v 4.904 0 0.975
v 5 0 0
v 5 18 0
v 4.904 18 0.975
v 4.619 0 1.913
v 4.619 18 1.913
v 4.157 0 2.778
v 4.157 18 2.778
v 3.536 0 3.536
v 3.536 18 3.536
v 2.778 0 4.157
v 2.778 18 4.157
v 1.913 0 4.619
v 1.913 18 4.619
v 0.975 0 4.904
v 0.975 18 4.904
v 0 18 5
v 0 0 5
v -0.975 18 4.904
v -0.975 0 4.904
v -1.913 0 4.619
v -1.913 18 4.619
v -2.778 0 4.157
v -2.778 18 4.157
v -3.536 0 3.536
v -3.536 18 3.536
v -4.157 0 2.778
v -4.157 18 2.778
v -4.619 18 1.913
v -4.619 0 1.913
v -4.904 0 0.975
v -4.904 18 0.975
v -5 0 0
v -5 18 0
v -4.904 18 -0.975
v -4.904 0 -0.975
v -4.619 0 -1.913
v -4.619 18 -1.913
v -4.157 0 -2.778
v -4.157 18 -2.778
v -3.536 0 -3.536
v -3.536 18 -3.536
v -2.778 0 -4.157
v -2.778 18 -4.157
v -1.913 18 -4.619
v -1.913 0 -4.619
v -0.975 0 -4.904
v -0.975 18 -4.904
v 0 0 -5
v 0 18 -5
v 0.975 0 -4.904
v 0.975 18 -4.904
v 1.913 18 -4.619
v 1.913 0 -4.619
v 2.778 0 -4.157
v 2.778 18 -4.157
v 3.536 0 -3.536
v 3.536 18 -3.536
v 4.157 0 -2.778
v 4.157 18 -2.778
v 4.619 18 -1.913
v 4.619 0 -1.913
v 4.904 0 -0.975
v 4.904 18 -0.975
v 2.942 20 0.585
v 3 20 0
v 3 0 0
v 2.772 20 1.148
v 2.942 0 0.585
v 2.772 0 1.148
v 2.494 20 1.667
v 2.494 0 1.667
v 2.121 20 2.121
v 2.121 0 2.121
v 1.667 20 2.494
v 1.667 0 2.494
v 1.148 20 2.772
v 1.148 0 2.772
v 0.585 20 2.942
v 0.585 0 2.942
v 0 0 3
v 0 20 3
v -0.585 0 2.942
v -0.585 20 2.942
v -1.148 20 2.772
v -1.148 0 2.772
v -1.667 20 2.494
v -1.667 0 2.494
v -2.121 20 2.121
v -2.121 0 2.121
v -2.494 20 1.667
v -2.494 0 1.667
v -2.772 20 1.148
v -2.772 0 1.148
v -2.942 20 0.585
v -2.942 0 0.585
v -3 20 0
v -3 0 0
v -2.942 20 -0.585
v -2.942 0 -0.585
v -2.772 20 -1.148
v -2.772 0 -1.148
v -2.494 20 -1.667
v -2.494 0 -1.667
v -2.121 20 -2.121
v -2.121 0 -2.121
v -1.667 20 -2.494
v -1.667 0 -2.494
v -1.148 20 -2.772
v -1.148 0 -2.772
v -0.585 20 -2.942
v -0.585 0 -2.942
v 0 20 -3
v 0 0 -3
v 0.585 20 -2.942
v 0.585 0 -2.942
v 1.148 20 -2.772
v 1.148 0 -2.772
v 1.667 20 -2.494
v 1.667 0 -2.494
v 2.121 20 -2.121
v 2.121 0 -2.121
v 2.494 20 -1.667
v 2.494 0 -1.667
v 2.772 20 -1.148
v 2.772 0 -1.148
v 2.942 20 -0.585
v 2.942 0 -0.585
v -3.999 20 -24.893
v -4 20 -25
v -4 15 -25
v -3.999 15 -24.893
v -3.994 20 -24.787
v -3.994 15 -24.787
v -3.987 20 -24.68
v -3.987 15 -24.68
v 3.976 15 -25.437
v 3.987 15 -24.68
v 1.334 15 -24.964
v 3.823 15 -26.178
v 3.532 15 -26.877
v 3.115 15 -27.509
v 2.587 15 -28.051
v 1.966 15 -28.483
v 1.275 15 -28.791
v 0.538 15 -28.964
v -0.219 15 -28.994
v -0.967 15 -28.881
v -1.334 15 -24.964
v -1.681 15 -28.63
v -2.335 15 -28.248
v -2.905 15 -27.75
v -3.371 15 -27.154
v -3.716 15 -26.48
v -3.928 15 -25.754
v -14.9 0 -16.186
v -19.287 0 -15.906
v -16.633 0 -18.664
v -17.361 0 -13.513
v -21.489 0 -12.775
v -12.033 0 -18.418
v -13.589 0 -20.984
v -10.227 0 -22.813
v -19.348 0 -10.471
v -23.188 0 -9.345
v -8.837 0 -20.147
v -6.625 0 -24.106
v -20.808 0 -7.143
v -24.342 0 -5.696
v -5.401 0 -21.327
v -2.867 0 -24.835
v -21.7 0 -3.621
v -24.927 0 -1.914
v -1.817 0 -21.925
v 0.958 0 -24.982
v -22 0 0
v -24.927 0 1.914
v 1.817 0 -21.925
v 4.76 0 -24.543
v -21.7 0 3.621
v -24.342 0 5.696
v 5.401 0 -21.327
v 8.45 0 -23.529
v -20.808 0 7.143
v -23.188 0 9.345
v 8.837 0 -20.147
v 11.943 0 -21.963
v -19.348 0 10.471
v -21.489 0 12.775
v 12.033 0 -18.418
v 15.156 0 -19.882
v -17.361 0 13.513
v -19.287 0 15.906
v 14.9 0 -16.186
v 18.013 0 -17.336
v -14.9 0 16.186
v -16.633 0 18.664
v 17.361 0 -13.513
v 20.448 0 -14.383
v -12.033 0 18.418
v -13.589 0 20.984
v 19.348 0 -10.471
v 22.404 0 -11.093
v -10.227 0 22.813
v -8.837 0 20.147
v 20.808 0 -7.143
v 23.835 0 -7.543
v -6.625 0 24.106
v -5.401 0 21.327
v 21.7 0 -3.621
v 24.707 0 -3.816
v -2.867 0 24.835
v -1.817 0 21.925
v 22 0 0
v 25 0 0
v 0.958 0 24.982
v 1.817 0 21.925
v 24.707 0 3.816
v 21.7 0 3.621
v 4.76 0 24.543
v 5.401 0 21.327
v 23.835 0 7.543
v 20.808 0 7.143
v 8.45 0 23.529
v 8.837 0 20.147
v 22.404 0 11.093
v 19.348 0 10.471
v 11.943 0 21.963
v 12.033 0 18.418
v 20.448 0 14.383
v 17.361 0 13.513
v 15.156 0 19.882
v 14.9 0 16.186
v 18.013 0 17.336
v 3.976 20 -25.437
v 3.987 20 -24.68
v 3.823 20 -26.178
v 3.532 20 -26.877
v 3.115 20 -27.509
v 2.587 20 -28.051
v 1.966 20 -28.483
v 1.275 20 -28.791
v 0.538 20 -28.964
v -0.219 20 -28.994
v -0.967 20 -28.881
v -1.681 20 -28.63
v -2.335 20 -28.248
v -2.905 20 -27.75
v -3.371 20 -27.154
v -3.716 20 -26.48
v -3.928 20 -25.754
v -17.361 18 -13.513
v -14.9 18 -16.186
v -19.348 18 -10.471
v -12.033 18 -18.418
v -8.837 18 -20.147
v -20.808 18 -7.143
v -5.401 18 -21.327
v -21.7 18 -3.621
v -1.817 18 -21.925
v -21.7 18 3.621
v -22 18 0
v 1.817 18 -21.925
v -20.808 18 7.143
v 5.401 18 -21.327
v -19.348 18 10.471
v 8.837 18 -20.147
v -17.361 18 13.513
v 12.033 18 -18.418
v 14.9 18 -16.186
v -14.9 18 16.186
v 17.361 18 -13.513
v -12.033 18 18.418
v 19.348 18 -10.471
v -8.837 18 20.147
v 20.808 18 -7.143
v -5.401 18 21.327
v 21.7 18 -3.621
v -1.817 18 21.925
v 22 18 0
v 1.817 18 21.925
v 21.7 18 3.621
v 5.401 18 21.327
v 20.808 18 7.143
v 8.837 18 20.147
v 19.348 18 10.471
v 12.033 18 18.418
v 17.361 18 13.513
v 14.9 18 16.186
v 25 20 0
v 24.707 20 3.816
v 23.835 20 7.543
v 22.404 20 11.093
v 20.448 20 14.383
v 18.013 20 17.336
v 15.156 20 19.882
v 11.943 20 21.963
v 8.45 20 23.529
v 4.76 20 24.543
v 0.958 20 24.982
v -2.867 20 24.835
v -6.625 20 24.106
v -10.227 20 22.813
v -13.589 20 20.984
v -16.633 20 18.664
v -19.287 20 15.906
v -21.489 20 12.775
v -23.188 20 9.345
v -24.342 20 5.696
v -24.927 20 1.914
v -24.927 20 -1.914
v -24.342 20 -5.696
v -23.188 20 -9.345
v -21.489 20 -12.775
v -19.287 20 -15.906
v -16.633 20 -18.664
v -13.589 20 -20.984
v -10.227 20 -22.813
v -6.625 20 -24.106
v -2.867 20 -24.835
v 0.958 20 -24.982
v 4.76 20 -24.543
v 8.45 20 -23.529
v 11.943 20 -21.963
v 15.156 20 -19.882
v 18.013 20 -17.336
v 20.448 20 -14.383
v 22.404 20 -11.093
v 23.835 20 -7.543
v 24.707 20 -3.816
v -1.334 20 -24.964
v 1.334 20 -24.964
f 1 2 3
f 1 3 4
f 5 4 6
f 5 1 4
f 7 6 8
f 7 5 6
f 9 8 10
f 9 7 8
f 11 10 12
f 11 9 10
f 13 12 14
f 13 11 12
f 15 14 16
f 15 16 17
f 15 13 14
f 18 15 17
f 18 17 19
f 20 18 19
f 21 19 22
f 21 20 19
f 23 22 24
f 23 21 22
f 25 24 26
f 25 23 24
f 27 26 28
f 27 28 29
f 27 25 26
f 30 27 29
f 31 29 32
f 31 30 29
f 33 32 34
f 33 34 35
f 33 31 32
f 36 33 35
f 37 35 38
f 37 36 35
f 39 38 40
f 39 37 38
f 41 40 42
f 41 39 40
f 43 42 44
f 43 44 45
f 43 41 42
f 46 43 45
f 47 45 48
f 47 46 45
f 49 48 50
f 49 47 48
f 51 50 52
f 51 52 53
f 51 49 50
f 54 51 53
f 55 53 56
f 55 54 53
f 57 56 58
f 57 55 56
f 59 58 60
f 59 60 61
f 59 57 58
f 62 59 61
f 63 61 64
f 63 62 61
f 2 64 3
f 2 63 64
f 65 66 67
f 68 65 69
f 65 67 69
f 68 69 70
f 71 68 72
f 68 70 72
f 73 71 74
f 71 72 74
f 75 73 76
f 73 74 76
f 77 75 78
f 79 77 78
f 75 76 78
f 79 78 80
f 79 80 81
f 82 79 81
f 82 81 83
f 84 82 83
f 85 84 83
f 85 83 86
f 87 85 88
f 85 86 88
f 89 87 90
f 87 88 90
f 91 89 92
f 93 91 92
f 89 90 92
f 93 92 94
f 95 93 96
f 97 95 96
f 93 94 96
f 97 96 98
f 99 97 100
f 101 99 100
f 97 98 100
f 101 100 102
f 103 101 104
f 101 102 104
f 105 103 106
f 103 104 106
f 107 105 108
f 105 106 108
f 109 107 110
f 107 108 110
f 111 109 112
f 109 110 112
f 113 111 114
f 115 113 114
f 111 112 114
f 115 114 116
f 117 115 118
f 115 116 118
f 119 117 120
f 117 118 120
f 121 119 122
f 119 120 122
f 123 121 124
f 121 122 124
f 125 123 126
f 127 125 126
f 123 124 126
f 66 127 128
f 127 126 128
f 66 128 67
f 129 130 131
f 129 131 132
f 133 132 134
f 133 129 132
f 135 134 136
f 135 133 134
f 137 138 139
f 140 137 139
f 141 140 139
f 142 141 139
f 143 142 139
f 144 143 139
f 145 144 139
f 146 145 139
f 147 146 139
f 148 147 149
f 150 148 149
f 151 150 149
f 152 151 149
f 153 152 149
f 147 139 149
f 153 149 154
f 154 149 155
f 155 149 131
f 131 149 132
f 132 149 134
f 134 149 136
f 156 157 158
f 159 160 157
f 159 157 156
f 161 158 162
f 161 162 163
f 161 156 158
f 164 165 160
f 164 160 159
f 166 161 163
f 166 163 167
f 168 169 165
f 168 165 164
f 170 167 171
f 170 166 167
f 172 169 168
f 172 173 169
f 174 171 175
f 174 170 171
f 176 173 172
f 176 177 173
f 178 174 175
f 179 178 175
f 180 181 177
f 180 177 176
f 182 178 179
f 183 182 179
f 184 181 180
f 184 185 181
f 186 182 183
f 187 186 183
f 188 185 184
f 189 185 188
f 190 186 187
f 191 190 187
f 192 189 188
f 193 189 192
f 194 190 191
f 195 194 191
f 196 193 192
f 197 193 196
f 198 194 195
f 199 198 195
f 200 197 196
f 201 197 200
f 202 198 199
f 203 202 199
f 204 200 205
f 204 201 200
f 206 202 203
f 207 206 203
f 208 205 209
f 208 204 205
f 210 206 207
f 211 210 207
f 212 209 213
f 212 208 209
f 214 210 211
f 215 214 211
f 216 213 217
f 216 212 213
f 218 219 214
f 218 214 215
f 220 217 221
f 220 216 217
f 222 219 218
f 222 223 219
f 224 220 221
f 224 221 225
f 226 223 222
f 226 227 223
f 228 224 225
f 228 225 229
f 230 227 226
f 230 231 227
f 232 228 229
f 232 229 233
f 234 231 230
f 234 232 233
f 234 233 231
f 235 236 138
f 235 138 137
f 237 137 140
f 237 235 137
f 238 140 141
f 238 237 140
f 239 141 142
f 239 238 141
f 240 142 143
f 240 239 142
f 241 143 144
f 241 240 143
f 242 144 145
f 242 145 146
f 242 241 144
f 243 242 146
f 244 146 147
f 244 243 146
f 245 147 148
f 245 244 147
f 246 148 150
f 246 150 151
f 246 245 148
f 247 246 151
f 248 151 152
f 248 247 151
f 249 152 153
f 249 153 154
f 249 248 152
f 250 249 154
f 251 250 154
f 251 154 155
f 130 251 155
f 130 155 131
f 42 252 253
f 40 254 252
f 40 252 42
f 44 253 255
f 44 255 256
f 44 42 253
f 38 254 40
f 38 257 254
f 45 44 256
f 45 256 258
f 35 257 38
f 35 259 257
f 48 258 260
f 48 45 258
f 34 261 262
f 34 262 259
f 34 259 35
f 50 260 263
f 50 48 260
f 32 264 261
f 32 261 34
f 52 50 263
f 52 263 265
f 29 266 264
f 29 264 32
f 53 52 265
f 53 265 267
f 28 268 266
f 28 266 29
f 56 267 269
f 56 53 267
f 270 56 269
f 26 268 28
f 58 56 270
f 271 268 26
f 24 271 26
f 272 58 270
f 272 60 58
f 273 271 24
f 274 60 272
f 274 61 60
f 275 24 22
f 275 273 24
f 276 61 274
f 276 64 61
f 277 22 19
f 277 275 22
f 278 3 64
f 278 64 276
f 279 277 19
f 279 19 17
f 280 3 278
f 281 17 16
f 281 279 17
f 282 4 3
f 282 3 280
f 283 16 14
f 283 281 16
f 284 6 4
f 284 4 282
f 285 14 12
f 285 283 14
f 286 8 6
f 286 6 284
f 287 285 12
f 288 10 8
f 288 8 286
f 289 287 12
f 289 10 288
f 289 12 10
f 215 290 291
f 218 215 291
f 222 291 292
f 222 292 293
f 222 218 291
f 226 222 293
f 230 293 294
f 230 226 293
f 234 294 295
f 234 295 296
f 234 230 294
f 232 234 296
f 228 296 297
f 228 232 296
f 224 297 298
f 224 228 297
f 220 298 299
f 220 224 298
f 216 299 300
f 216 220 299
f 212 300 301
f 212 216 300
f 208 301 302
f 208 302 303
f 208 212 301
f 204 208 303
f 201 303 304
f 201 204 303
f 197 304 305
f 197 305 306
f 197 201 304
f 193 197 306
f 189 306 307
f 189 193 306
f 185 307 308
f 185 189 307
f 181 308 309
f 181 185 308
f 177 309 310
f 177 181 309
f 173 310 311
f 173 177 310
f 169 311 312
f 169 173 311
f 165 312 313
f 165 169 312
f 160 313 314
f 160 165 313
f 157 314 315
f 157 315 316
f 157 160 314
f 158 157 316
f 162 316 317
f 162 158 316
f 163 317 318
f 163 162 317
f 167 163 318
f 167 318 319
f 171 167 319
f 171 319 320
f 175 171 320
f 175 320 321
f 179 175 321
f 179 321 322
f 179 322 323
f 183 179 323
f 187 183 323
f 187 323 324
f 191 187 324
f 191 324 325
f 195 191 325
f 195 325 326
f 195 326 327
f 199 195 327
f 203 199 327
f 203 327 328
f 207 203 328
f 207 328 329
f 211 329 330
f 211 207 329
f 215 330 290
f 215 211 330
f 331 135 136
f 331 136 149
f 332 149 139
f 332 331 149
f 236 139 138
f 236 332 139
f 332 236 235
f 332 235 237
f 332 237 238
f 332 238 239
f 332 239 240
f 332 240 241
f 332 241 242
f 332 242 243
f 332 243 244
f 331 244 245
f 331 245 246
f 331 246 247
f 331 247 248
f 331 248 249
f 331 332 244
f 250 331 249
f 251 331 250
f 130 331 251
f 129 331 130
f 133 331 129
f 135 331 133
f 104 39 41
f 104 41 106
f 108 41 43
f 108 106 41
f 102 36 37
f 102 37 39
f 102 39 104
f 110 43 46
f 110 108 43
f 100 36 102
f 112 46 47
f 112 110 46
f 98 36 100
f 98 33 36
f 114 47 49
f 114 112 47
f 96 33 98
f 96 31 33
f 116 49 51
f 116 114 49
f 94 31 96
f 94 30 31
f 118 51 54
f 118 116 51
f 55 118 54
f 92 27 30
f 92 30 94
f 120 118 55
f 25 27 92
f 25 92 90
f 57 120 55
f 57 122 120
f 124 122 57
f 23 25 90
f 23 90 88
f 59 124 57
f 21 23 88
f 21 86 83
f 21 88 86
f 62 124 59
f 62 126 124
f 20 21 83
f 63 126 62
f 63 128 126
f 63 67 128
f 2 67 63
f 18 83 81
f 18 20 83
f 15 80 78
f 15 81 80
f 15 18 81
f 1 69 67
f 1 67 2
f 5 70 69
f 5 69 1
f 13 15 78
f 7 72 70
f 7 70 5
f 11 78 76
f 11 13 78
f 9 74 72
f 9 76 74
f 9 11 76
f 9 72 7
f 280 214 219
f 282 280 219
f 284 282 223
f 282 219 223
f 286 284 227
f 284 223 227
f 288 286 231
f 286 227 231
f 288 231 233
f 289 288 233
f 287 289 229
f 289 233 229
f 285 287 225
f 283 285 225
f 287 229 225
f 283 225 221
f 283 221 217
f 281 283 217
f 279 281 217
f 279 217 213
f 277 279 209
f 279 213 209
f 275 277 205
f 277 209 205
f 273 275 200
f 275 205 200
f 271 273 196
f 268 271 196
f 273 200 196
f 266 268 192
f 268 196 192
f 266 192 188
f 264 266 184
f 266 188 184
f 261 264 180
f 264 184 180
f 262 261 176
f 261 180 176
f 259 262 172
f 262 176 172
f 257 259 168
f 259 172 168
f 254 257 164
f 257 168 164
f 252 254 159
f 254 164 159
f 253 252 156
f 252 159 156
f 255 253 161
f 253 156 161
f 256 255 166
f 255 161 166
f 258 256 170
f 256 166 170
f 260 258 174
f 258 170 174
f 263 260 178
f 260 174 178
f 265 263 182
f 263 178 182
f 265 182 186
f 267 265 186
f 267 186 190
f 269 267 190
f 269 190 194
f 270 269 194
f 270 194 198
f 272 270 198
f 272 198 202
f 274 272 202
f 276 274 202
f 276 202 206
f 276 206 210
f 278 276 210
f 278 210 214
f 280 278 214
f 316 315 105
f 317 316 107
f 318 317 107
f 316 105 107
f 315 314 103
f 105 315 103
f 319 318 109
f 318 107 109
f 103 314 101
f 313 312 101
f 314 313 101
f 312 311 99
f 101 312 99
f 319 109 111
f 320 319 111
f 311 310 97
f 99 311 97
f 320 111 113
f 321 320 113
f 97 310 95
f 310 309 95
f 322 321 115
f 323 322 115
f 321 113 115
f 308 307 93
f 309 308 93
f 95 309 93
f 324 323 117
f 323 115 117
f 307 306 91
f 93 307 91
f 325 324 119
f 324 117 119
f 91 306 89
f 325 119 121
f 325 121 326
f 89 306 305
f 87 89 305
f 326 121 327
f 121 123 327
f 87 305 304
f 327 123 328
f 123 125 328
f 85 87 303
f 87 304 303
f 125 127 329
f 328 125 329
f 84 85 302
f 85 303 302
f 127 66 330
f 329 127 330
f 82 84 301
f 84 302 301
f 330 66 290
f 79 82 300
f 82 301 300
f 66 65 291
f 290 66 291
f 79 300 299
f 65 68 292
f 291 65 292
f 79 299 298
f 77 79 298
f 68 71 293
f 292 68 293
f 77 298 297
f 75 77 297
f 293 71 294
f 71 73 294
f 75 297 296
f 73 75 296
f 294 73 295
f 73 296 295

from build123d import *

# Parameters (mm, degrees)
F0_R     = 25
F0_R_2   = 22
F0_R_3   = 5
F0_R_4   = 3
F1_DEPTH = 20
F2_DEPTH = 18
F4_DEPTH = 5


with BuildPart() as f1:
    # F0 (on Front) → F1 (new body)
    with BuildSketch(Plane.XZ):
        Circle(F0_R)
        Circle(F0_R_2, mode=Mode.SUBTRACT)
        Circle(F0_R_2)
        Circle(F0_R_3, mode=Mode.SUBTRACT)
        Circle(F0_R_3)
        Circle(F0_R_4, mode=Mode.SUBTRACT)
    extrude(amount=-F1_DEPTH)

    # F0 (on Front) → F2 (cut)
    with BuildSketch(Plane.XZ):
        Circle(F0_R_2)
        Circle(F0_R_3, mode=Mode.SUBTRACT)
    extrude(amount=-F2_DEPTH, mode=Mode.SUBTRACT)


with BuildPart() as f4:
    # F3 (on face) → F4 (new body)
    with BuildSketch(Plane(origin=(0, 20, 0), x_dir=(-1, 0, 0), z_dir=(0, 1, 0))):
        with BuildLine():
            ThreePointArc((-3.9871794542, -24.68), (-0.1601283598, -28.9967935784), (4, -25))
            ThreePointArc((4, -25), (3.9967935784, -24.8398716402), (3.9871794542, -24.68))
            ThreePointArc((3.9871794542, -24.68), (0, -25), (-3.9871794542, -24.68))
        make_face()
    extrude(amount=-F4_DEPTH)


solid = Compound([f1.part, f4.part])
